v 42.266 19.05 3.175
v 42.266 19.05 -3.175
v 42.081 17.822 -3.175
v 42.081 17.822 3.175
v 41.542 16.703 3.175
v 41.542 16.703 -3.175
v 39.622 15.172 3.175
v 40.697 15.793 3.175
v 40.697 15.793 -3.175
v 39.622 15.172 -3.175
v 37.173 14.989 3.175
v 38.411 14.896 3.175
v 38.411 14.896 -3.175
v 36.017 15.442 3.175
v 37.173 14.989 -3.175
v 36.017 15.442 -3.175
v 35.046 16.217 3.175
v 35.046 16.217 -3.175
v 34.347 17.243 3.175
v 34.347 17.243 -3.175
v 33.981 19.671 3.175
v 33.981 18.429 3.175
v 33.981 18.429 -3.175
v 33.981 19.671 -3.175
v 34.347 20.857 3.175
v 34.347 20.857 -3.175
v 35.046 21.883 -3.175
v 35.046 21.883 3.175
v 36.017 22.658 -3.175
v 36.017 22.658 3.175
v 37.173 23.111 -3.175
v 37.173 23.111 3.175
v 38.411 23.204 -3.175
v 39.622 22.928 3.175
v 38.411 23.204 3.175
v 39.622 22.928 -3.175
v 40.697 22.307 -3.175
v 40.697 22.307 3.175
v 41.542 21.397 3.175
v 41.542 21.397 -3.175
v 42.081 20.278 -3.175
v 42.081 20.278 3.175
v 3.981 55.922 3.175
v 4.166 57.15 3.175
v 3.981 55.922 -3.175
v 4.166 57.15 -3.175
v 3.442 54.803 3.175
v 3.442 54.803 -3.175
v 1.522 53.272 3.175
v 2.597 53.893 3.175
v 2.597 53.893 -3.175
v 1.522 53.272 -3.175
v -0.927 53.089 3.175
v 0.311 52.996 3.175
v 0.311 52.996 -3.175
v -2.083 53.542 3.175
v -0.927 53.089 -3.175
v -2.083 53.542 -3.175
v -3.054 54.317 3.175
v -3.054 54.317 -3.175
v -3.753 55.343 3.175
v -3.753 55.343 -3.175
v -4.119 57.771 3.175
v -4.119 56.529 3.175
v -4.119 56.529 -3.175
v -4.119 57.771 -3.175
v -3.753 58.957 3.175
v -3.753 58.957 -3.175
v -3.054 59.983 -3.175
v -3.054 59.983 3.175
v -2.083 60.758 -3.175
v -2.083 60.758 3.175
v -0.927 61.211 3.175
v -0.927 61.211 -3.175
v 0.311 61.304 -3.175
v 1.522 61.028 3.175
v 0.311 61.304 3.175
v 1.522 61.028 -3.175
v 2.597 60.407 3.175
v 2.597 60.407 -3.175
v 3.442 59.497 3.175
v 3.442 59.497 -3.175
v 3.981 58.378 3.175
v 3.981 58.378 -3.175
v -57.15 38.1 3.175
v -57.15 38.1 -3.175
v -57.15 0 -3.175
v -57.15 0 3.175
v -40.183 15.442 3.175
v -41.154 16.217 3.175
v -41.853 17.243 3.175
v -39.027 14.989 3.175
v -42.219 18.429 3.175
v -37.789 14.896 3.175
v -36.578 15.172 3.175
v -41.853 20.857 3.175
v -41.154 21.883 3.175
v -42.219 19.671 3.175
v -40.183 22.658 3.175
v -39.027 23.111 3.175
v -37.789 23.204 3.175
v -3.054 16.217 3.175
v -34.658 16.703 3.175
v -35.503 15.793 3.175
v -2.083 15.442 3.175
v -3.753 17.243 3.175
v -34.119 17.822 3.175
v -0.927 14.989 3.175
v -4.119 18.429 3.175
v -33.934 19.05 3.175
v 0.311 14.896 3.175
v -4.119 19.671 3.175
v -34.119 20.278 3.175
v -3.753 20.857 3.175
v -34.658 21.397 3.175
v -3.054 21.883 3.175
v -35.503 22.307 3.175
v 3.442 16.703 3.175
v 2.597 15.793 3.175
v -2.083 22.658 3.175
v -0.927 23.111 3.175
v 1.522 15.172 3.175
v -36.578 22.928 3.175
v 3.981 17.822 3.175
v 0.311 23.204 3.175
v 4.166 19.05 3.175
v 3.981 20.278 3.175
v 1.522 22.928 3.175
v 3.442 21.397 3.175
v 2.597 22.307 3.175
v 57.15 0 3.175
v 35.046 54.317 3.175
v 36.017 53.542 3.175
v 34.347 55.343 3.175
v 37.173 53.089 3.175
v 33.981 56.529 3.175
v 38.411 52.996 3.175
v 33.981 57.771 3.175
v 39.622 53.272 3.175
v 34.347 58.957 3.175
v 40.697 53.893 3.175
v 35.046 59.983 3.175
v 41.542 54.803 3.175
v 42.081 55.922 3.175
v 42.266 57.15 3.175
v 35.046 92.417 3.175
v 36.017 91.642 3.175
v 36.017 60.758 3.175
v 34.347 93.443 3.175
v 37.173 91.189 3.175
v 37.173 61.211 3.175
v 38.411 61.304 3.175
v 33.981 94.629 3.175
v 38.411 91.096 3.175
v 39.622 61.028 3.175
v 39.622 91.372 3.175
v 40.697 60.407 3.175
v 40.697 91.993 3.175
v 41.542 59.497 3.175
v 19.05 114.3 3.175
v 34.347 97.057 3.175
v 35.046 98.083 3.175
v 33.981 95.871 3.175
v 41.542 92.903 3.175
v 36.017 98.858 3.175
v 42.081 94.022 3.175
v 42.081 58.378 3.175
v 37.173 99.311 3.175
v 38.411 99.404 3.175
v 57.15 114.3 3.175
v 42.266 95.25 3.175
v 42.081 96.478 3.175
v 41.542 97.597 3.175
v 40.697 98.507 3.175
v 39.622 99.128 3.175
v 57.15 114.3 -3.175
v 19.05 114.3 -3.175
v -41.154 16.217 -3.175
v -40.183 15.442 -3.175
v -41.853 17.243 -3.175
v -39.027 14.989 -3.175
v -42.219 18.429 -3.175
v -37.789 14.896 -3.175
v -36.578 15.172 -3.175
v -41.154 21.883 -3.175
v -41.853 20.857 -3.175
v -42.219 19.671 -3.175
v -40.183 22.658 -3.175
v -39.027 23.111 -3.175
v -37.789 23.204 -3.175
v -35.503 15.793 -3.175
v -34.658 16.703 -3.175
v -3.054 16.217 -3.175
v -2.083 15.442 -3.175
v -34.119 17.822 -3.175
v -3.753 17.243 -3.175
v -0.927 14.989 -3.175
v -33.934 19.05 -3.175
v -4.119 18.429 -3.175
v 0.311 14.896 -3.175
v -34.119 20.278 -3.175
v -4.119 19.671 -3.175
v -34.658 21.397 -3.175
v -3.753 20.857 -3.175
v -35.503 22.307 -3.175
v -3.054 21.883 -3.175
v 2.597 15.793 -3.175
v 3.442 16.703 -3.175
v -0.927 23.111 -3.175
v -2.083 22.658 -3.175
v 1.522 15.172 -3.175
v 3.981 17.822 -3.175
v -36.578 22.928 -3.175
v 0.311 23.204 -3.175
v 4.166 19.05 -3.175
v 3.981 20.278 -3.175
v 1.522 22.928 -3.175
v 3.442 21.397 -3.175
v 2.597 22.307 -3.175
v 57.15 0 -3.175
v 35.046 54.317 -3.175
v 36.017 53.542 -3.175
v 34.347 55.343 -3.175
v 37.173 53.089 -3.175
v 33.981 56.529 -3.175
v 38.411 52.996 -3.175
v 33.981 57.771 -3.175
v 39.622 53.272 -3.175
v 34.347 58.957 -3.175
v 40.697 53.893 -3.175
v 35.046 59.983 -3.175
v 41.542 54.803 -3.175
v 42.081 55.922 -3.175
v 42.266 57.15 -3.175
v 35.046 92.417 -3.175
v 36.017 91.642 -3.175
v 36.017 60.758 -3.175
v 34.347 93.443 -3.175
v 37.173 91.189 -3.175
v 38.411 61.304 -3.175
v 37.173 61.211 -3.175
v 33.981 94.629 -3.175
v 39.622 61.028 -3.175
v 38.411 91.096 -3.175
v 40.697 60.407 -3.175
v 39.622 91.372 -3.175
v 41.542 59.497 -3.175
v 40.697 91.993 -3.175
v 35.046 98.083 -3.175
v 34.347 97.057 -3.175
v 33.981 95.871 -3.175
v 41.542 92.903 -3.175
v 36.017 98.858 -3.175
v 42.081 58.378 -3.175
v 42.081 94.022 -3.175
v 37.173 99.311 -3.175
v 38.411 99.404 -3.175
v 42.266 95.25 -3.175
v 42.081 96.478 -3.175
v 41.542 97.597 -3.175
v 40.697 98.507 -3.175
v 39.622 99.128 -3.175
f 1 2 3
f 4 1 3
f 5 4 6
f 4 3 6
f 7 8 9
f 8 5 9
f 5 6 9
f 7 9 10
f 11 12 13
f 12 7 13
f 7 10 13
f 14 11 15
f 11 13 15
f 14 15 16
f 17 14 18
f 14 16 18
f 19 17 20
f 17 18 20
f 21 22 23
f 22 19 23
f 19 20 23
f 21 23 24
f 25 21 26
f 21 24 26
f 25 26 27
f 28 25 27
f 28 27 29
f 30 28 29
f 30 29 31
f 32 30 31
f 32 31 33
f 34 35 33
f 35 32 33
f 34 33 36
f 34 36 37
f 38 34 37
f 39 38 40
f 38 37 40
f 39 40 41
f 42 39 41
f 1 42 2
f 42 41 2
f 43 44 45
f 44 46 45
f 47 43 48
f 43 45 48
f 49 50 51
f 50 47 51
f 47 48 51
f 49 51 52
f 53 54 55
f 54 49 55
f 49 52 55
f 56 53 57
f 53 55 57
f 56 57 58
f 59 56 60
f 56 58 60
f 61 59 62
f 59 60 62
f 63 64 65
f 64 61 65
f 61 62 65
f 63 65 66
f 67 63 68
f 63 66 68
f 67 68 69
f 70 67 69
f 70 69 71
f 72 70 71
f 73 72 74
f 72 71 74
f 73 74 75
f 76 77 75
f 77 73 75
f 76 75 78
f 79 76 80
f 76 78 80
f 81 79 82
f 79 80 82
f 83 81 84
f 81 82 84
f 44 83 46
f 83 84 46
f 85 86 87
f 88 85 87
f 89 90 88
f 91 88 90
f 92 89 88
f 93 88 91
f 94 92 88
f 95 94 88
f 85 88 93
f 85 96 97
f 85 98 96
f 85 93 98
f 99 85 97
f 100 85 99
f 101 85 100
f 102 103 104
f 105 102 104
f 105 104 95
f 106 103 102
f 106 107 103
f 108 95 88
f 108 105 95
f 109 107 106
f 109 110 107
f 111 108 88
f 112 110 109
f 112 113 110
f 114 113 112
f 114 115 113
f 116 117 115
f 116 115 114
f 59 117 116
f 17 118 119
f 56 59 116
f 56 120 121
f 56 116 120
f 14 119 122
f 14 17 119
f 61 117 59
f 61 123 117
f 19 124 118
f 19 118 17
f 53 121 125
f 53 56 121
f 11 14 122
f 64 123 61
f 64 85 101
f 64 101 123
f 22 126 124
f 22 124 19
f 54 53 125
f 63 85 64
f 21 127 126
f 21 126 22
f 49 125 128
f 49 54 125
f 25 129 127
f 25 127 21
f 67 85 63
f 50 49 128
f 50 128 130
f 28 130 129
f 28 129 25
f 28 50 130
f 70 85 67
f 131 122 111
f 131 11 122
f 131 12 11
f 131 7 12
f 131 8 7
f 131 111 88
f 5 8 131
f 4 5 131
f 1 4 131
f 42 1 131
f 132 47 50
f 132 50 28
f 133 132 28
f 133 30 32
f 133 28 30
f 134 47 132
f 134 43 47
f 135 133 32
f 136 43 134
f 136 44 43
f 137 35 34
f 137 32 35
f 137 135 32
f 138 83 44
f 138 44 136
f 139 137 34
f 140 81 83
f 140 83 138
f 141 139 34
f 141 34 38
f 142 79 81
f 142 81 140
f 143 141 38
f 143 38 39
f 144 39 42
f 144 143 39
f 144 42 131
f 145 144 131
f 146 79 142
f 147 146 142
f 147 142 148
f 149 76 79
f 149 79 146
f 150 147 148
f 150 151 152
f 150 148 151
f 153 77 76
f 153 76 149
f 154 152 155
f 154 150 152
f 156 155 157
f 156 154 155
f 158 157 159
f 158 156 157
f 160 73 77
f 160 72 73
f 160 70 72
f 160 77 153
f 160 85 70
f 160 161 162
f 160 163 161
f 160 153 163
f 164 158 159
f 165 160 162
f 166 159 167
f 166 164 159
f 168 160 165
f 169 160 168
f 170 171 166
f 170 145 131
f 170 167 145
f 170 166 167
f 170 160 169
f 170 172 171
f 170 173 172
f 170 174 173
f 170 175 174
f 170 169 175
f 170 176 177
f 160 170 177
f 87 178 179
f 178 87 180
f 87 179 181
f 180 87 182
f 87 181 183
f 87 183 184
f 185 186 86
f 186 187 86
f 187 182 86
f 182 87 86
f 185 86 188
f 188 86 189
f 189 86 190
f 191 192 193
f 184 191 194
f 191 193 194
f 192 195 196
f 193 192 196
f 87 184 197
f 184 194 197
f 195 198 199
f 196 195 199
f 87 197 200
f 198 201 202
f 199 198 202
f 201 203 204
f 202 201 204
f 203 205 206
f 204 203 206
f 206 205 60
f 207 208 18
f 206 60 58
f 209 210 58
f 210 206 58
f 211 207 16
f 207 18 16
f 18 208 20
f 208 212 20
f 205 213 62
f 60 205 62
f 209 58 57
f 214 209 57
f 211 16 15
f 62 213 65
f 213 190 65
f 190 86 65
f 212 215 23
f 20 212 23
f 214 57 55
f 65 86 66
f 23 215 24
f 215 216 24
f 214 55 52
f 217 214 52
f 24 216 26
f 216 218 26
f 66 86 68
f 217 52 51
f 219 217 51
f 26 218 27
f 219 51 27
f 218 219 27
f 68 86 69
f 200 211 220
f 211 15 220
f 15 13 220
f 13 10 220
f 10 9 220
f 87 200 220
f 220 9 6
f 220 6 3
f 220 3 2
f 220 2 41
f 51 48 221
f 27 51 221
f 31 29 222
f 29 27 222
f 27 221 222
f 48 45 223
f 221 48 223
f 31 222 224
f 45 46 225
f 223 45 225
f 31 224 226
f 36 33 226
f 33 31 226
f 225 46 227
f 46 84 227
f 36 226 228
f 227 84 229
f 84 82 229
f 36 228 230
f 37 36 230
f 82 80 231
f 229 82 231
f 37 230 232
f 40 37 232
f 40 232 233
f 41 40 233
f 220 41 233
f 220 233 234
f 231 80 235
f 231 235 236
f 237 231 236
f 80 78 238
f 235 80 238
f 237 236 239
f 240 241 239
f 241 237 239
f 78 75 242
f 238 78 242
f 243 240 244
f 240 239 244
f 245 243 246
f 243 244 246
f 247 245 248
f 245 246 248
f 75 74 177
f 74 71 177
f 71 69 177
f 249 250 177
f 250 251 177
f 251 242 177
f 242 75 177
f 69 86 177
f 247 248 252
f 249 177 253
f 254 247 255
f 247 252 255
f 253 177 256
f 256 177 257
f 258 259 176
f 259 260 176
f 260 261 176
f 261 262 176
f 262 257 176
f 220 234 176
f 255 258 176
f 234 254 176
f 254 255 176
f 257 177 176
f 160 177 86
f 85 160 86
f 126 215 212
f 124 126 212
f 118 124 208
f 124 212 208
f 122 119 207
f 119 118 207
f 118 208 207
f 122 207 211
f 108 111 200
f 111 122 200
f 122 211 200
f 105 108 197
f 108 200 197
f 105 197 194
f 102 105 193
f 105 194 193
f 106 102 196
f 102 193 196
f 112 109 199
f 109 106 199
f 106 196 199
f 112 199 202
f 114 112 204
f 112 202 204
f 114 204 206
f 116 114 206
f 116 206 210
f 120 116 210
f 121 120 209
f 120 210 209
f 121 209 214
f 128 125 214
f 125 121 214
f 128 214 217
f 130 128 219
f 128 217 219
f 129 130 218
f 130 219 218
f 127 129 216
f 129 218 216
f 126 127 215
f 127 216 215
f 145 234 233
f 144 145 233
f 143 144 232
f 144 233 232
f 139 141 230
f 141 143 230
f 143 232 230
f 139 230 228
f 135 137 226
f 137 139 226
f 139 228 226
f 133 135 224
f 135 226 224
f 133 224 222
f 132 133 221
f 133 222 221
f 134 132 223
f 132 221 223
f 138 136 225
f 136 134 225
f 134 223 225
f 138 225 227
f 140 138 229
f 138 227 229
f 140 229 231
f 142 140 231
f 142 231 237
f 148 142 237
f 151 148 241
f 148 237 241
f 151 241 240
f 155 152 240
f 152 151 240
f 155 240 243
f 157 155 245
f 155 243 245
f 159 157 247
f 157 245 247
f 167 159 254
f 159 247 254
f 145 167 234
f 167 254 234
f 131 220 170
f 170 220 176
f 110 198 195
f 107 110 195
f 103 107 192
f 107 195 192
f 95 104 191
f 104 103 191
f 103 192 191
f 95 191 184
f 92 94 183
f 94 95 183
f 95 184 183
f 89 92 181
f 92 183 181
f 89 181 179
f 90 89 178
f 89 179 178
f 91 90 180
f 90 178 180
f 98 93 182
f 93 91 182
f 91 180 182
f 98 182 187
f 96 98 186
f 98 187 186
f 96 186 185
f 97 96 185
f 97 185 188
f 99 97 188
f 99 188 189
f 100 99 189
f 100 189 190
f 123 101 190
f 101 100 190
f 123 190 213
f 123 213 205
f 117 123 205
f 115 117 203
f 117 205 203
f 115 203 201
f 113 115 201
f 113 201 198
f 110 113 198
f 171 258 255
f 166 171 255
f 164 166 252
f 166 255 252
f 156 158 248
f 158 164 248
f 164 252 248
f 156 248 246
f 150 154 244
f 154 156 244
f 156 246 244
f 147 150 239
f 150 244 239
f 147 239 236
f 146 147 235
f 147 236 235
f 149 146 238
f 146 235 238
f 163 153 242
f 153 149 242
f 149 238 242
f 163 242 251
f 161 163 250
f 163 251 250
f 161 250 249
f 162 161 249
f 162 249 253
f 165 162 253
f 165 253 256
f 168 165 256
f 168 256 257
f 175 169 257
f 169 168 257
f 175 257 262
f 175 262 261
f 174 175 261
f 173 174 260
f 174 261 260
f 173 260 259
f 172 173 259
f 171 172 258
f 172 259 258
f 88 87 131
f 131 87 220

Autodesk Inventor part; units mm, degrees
ref_plane "YZ Plane" through (0, 0, 0) normal (1, 0, 0) x (0, 1, 0)
ref_plane "XZ Plane" through (0, 0, 0) normal (0, 1, 0) x (-1, 0, 0)
ref_plane "XY Plane" through (0, 0, 0) normal (0, 0, 1) x (1, 0, 0)
sketch "Sketch_1" plane through (0, 0, 0) normal (0, 0, 1) x (1, 0, 0)
  line L0 (-57.15, 38.1) -> (-57.15, 0)
  line L1 (-57.15, 0) -> (57.15, 0)
  line L2 (57.15, 0) -> (57.15, 114.3)
  line L3 (57.15, 114.3) -> (19.05, 114.3)
  line L4 (19.05, 114.3) -> (-57.15, 38.1)
  circle A0 centre (38.1, 19.05) radius 4.1656
  circle A1 centre (38.1, 57.15) radius 4.1656
  circle A2 centre (38.1, 95.25) radius 4.1656
  circle A3 centre (0, 19.05) radius 4.1656
  circle A4 centre (0, 57.15) radius 4.1656
  circle A5 centre (-38.1, 19.05) radius 4.1656
extrude "Extrusion1" add sketch "Sketch_1" along normal mid plane 6.35
properties part number "4461"
